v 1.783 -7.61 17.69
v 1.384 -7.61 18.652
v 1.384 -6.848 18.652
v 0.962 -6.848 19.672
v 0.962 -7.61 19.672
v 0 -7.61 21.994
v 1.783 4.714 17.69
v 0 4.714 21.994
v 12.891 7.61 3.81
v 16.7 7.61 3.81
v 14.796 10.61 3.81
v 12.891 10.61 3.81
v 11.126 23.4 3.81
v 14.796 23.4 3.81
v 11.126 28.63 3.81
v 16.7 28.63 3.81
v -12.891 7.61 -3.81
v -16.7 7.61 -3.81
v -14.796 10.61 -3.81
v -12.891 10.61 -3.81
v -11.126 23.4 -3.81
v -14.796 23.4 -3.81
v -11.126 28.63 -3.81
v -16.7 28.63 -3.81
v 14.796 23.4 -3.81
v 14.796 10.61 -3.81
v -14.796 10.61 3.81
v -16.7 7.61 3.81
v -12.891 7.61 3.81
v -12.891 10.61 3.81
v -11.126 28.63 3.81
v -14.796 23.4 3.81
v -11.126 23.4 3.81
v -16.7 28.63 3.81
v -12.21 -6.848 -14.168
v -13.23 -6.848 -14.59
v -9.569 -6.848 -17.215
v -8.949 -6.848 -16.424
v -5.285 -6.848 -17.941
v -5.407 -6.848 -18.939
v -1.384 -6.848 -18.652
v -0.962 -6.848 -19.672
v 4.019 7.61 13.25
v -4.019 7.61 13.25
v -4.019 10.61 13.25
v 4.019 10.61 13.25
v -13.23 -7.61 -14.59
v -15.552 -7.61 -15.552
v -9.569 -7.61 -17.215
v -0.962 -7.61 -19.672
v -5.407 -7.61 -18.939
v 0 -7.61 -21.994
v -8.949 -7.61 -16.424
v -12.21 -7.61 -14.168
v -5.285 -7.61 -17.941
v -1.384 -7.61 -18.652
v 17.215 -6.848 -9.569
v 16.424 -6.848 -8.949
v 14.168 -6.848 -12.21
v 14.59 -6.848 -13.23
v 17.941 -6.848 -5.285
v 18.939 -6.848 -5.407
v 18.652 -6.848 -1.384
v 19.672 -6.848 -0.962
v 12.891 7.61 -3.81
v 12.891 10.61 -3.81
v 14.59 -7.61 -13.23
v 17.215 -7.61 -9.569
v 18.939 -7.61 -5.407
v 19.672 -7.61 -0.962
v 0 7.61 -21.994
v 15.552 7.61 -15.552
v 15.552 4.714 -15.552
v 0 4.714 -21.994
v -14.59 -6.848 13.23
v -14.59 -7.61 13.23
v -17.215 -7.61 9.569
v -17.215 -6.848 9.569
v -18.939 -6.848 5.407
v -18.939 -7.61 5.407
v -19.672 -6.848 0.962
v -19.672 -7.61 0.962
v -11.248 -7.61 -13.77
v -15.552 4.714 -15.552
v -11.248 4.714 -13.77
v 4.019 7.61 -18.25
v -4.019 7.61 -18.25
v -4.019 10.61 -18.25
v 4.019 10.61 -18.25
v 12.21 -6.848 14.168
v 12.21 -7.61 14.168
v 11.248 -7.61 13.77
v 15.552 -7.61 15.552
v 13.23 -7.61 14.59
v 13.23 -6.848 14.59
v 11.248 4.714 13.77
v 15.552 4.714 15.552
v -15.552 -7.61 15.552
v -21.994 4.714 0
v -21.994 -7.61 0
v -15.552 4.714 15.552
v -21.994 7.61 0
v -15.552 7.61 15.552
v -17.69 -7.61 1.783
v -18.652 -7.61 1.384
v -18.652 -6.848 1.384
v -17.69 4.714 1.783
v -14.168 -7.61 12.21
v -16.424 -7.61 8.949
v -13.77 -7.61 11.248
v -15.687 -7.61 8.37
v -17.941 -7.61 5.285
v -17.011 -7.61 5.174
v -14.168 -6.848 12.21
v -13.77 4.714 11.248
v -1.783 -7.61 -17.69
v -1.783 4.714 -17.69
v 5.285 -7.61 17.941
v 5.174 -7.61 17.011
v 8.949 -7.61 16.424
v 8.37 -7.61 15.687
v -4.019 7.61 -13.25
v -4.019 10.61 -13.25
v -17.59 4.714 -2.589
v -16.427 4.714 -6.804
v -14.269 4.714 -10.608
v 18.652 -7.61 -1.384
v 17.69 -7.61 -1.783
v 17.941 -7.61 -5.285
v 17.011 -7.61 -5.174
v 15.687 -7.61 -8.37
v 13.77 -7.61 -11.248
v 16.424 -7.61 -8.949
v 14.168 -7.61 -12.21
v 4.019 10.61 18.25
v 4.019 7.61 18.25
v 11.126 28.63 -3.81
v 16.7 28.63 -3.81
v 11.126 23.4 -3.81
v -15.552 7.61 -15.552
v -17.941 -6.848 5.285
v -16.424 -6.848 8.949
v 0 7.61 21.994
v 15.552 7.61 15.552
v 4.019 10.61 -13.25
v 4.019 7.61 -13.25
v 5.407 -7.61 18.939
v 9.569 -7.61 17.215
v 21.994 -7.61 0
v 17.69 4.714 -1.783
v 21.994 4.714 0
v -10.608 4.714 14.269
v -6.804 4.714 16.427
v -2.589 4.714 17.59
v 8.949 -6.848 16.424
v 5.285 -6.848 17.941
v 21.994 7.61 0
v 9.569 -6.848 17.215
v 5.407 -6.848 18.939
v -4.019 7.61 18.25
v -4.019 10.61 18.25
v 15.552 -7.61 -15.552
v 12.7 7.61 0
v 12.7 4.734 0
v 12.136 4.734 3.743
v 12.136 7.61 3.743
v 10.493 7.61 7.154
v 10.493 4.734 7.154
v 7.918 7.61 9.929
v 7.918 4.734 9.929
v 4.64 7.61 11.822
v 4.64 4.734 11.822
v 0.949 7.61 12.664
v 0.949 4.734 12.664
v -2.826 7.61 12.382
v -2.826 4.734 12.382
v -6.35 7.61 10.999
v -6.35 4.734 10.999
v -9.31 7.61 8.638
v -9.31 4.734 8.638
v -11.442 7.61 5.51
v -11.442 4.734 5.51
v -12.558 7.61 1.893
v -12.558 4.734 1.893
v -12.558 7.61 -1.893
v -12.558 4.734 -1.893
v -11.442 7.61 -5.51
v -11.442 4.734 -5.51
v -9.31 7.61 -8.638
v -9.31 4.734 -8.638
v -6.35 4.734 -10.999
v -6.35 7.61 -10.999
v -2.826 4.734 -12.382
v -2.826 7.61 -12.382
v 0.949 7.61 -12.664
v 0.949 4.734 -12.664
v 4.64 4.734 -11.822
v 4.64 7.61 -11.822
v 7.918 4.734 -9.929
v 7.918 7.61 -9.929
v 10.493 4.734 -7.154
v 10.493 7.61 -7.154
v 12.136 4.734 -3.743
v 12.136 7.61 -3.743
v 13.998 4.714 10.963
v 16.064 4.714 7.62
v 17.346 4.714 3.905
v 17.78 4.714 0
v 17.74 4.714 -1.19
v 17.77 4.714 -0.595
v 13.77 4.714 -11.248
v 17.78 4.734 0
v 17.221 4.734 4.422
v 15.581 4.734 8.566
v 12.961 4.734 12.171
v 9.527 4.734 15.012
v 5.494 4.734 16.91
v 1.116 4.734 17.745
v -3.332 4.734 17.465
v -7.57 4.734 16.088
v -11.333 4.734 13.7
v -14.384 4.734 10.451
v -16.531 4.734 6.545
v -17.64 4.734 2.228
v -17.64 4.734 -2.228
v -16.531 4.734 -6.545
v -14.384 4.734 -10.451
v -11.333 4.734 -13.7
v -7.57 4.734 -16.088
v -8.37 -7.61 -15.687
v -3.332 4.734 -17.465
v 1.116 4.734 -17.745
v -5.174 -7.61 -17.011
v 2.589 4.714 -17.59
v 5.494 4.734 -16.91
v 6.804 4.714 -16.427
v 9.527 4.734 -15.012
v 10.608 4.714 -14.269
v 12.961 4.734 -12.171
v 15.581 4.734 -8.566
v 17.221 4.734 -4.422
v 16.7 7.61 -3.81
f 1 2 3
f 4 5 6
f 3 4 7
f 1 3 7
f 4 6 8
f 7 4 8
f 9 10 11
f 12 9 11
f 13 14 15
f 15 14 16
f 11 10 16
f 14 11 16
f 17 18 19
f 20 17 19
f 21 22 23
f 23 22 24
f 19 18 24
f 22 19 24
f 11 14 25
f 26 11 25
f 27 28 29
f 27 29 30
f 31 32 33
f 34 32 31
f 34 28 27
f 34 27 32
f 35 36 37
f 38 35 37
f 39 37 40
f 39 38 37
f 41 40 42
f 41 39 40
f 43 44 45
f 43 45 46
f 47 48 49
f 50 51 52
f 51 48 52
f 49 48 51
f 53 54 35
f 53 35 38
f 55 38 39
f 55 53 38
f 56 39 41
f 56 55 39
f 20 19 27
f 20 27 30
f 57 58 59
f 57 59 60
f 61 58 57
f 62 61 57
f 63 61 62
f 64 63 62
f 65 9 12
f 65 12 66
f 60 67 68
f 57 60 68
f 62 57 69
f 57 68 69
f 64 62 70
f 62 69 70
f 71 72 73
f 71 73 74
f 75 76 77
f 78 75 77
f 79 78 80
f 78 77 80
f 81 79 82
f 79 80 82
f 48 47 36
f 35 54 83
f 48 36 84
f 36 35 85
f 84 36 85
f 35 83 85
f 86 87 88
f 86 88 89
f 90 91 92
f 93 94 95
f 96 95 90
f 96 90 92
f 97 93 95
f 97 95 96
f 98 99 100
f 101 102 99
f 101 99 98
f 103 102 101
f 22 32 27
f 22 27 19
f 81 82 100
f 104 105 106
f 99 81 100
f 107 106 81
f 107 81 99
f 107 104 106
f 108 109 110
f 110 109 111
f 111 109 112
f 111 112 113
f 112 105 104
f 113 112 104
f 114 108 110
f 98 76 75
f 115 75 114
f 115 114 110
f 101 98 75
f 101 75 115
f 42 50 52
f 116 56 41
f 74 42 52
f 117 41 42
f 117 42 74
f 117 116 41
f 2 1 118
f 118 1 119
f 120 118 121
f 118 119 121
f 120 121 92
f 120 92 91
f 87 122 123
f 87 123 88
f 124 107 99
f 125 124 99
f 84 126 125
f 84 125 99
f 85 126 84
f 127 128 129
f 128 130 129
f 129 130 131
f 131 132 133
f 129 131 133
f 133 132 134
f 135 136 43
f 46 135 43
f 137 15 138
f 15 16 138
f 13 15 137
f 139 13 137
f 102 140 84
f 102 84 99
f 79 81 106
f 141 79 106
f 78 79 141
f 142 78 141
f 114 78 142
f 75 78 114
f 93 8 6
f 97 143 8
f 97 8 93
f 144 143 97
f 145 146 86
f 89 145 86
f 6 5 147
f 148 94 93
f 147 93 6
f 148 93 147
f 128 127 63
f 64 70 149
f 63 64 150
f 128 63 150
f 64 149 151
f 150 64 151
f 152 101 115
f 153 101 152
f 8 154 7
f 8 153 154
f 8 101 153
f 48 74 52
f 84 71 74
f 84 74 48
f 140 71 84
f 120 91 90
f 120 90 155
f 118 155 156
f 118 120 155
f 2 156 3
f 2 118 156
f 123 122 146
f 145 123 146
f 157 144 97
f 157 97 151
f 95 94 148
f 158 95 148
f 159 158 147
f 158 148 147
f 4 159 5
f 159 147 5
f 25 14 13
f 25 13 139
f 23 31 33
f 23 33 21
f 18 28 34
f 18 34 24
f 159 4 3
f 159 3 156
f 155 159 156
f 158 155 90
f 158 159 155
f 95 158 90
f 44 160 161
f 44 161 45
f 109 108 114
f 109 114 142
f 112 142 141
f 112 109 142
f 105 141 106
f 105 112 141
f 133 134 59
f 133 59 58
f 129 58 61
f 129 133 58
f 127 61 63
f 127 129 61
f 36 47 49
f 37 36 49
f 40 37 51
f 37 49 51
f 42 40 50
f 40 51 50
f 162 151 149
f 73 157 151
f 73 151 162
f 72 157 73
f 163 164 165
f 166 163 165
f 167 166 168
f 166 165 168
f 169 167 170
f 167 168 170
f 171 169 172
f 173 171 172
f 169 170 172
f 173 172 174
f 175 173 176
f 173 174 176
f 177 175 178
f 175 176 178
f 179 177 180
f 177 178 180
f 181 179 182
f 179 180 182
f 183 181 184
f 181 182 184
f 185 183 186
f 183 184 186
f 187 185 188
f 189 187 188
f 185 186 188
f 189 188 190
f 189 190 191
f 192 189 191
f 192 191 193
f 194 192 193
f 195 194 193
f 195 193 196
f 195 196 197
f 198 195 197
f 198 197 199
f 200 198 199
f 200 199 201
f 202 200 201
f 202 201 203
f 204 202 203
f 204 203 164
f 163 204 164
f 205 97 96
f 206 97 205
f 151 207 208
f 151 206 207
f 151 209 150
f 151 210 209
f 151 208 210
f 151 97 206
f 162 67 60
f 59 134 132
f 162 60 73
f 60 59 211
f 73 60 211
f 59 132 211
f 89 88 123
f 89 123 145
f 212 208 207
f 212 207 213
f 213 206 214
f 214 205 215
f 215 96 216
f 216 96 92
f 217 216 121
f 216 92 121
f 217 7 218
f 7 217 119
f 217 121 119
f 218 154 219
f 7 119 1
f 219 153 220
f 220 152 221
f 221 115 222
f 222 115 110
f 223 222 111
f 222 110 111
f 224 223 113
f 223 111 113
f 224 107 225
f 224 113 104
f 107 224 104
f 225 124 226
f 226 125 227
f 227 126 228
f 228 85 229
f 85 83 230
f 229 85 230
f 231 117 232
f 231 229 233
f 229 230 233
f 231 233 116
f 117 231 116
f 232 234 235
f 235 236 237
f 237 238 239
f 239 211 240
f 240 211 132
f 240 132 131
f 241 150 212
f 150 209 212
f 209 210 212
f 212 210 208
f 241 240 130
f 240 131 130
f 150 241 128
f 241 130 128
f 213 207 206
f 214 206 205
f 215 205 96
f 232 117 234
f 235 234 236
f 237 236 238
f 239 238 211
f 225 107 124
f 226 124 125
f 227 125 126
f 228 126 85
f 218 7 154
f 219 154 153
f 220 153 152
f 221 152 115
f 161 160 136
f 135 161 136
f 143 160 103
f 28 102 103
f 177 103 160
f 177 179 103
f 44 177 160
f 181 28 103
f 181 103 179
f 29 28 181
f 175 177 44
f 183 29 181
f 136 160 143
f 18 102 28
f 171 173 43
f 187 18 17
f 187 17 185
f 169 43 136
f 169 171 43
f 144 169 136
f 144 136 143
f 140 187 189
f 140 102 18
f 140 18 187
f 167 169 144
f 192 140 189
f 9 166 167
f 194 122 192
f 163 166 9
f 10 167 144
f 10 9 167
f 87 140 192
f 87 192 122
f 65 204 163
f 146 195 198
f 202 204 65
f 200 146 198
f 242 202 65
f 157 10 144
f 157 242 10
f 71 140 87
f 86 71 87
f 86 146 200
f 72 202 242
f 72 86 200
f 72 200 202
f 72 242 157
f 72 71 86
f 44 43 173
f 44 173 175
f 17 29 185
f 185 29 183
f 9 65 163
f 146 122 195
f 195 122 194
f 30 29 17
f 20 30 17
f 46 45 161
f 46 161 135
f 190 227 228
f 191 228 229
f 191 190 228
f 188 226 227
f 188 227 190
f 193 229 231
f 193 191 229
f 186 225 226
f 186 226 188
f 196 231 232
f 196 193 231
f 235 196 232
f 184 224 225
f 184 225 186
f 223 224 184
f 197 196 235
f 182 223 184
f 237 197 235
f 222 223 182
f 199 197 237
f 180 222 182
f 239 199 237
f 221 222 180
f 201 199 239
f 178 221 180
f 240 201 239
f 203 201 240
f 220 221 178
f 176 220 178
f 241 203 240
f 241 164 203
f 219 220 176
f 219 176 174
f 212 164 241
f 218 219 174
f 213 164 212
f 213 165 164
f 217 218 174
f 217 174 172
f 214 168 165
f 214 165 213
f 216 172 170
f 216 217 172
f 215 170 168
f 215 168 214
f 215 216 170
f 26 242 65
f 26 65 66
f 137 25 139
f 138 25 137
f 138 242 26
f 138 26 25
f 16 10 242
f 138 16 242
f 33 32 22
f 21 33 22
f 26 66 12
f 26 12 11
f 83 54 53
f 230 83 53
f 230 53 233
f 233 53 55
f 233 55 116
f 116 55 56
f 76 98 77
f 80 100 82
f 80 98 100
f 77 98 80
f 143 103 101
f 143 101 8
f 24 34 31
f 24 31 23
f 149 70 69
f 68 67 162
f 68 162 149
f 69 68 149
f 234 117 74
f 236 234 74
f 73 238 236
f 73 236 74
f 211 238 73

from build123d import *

# Parameters (mm, degrees)
BOSS_EXTRUDE1_DEPTH = 7.61
SKETCH5_R           = 17.78
CUT_EXTRUDE2_DEPTH  = 12.3444
SKETCH6_R           = 12.7
CUT_EXTRUDE3_DEPTH  = 3.8756
SKETCH7_W           = 16.833639174
SKETCH7_H           = 12.3244
CUT_EXTRUDE4_DEPTH  = 50.056819587
SKETCH8_W           = 16.833639174
SKETCH8_H           = 12.3244
CUT_EXTRUDE5_DEPTH  = 50.056819587
SKETCH10_R          = 19.69527877
SKETCH10_R_2        = 18.703643049
CUT_EXTRUDE7_DEPTH  = 0.762
SKETCH11_W          = 3.81
SKETCH11_H          = 7.62
BOSS_EXTRUDE2_DEPTH = 21.02
SKETCH13_W          = 29.591
SKETCH13_H          = 7.62
CUT_EXTRUDE8_DEPTH  = 18.02
SKETCH15_W          = 8.037943886
SKETCH15_H          = 5
BOSS_EXTRUDE3_DEPTH = 3
SKETCH16_W          = 7.62
SKETCH16_H          = 5.23
BOSS_EXTRUDE4_DEPTH = 3.67


with BuildPart() as part:
    # Sketch1 → Boss-Extrude1 (new body, symmetric)
    with BuildSketch(Plane(origin=(0, 0, 0), x_dir=(1, 0, 0), z_dir=(0, 1, 0))):
        Polygon((21.99420951, 0), (15.552254691, 15.552254691), (0, 21.99420951), (-15.552254691, 15.552254691), (-21.99420951, 0), (-15.552254691, -15.552254691), (0, -21.99420951), (15.552254691, -15.552254691), align=None)
    extrude(amount=BOSS_EXTRUDE1_DEPTH, both=True)

    # Sketch5 → Cut-Extrude2 (cut)
    with BuildSketch(Plane.XZ.offset(7.61)):
        Circle(SKETCH5_R)
    extrude(amount=-CUT_EXTRUDE2_DEPTH, mode=Mode.SUBTRACT)

    # Sketch6 → Cut-Extrude3 (cut, through all)
    with BuildSketch(Plane.XZ.offset(-4.7344)):
        Circle(SKETCH6_R)
    extrude(amount=-CUT_EXTRUDE3_DEPTH, mode=Mode.SUBTRACT)

    # Sketch7 → Cut-Extrude4 (cut, through all)
    with BuildSketch(Plane(origin=(-7.776127346, 0, 18.773232101), x_dir=(0.923879533, 0, 0.382683432), z_dir=(-0.382683432, 0, 0.923879533))):
        with Locations((0, -1.4478)):
            Rectangle(SKETCH7_W, SKETCH7_H)
    extrude(amount=-CUT_EXTRUDE4_DEPTH, mode=Mode.SUBTRACT)

    # Sketch8 → Cut-Extrude5 (cut, through all)
    with BuildSketch(Plane(origin=(18.773232101, 0, 7.776127346), x_dir=(0.382683432, 0, -0.923879533), z_dir=(0.923879533, 0, 0.382683432))):
        with Locations((0, -1.4478)):
            Rectangle(SKETCH8_W, SKETCH8_H)
    extrude(amount=-CUT_EXTRUDE5_DEPTH, mode=Mode.SUBTRACT)

    # Sketch10 → Cut-Extrude7 (cut)
    with BuildSketch(Plane.XZ.offset(7.61)):
        Circle(SKETCH10_R)
        Circle(SKETCH10_R_2, mode=Mode.SUBTRACT)
    extrude(amount=-CUT_EXTRUDE7_DEPTH, mode=Mode.SUBTRACT)

    # Sketch11 → Boss-Extrude2 (add)
    with BuildSketch(Plane(origin=(0, 7.61, 0), x_dir=(1, 0, 0), z_dir=(0, 1, 0))):
        with Locations((14.7955, 0)):
            Rectangle(SKETCH11_W, SKETCH11_H)
        with Locations((-14.7955, 0)):
            Rectangle(SKETCH11_W, SKETCH11_H)
    extrude(amount=BOSS_EXTRUDE2_DEPTH)

    # Sketch13 → Cut-Extrude8 (cut)
    with BuildSketch(Plane(origin=(0, 28.63, 0), x_dir=(1, 0, 0), z_dir=(0, 1, 0))):
        Rectangle(SKETCH13_W, SKETCH13_H)
    extrude(amount=-CUT_EXTRUDE8_DEPTH, mode=Mode.SUBTRACT)

    # Sketch15 → Boss-Extrude3 (add)
    with BuildSketch(Plane(origin=(0, 7.61, 0), x_dir=(1, 0, 0), z_dir=(0, 1, 0))):
        with Locations((0, -15.75)):
            Rectangle(SKETCH15_W, SKETCH15_H)
        with Locations((0, 15.75)):
            Rectangle(SKETCH15_W, SKETCH15_H)
    extrude(amount=BOSS_EXTRUDE3_DEPTH)

    # Sketch16 → Boss-Extrude4 (add)
    with BuildSketch(Plane(origin=(-14.7955, 0, 0), x_dir=(0, 0, -1), z_dir=(1, 0, 0))):
        with Locations((0, 26.015)):
            Rectangle(SKETCH16_W, SKETCH16_H)
    boss_extrude4 = extrude(amount=BOSS_EXTRUDE4_DEPTH)

    # Mirror1: Boss-Extrude4 across plane
    add(boss_extrude4.mirror(Plane(origin=(0, 0, 0), x_dir=(0, 0, 1), z_dir=(1, 0, 0))))


solid = part.part
